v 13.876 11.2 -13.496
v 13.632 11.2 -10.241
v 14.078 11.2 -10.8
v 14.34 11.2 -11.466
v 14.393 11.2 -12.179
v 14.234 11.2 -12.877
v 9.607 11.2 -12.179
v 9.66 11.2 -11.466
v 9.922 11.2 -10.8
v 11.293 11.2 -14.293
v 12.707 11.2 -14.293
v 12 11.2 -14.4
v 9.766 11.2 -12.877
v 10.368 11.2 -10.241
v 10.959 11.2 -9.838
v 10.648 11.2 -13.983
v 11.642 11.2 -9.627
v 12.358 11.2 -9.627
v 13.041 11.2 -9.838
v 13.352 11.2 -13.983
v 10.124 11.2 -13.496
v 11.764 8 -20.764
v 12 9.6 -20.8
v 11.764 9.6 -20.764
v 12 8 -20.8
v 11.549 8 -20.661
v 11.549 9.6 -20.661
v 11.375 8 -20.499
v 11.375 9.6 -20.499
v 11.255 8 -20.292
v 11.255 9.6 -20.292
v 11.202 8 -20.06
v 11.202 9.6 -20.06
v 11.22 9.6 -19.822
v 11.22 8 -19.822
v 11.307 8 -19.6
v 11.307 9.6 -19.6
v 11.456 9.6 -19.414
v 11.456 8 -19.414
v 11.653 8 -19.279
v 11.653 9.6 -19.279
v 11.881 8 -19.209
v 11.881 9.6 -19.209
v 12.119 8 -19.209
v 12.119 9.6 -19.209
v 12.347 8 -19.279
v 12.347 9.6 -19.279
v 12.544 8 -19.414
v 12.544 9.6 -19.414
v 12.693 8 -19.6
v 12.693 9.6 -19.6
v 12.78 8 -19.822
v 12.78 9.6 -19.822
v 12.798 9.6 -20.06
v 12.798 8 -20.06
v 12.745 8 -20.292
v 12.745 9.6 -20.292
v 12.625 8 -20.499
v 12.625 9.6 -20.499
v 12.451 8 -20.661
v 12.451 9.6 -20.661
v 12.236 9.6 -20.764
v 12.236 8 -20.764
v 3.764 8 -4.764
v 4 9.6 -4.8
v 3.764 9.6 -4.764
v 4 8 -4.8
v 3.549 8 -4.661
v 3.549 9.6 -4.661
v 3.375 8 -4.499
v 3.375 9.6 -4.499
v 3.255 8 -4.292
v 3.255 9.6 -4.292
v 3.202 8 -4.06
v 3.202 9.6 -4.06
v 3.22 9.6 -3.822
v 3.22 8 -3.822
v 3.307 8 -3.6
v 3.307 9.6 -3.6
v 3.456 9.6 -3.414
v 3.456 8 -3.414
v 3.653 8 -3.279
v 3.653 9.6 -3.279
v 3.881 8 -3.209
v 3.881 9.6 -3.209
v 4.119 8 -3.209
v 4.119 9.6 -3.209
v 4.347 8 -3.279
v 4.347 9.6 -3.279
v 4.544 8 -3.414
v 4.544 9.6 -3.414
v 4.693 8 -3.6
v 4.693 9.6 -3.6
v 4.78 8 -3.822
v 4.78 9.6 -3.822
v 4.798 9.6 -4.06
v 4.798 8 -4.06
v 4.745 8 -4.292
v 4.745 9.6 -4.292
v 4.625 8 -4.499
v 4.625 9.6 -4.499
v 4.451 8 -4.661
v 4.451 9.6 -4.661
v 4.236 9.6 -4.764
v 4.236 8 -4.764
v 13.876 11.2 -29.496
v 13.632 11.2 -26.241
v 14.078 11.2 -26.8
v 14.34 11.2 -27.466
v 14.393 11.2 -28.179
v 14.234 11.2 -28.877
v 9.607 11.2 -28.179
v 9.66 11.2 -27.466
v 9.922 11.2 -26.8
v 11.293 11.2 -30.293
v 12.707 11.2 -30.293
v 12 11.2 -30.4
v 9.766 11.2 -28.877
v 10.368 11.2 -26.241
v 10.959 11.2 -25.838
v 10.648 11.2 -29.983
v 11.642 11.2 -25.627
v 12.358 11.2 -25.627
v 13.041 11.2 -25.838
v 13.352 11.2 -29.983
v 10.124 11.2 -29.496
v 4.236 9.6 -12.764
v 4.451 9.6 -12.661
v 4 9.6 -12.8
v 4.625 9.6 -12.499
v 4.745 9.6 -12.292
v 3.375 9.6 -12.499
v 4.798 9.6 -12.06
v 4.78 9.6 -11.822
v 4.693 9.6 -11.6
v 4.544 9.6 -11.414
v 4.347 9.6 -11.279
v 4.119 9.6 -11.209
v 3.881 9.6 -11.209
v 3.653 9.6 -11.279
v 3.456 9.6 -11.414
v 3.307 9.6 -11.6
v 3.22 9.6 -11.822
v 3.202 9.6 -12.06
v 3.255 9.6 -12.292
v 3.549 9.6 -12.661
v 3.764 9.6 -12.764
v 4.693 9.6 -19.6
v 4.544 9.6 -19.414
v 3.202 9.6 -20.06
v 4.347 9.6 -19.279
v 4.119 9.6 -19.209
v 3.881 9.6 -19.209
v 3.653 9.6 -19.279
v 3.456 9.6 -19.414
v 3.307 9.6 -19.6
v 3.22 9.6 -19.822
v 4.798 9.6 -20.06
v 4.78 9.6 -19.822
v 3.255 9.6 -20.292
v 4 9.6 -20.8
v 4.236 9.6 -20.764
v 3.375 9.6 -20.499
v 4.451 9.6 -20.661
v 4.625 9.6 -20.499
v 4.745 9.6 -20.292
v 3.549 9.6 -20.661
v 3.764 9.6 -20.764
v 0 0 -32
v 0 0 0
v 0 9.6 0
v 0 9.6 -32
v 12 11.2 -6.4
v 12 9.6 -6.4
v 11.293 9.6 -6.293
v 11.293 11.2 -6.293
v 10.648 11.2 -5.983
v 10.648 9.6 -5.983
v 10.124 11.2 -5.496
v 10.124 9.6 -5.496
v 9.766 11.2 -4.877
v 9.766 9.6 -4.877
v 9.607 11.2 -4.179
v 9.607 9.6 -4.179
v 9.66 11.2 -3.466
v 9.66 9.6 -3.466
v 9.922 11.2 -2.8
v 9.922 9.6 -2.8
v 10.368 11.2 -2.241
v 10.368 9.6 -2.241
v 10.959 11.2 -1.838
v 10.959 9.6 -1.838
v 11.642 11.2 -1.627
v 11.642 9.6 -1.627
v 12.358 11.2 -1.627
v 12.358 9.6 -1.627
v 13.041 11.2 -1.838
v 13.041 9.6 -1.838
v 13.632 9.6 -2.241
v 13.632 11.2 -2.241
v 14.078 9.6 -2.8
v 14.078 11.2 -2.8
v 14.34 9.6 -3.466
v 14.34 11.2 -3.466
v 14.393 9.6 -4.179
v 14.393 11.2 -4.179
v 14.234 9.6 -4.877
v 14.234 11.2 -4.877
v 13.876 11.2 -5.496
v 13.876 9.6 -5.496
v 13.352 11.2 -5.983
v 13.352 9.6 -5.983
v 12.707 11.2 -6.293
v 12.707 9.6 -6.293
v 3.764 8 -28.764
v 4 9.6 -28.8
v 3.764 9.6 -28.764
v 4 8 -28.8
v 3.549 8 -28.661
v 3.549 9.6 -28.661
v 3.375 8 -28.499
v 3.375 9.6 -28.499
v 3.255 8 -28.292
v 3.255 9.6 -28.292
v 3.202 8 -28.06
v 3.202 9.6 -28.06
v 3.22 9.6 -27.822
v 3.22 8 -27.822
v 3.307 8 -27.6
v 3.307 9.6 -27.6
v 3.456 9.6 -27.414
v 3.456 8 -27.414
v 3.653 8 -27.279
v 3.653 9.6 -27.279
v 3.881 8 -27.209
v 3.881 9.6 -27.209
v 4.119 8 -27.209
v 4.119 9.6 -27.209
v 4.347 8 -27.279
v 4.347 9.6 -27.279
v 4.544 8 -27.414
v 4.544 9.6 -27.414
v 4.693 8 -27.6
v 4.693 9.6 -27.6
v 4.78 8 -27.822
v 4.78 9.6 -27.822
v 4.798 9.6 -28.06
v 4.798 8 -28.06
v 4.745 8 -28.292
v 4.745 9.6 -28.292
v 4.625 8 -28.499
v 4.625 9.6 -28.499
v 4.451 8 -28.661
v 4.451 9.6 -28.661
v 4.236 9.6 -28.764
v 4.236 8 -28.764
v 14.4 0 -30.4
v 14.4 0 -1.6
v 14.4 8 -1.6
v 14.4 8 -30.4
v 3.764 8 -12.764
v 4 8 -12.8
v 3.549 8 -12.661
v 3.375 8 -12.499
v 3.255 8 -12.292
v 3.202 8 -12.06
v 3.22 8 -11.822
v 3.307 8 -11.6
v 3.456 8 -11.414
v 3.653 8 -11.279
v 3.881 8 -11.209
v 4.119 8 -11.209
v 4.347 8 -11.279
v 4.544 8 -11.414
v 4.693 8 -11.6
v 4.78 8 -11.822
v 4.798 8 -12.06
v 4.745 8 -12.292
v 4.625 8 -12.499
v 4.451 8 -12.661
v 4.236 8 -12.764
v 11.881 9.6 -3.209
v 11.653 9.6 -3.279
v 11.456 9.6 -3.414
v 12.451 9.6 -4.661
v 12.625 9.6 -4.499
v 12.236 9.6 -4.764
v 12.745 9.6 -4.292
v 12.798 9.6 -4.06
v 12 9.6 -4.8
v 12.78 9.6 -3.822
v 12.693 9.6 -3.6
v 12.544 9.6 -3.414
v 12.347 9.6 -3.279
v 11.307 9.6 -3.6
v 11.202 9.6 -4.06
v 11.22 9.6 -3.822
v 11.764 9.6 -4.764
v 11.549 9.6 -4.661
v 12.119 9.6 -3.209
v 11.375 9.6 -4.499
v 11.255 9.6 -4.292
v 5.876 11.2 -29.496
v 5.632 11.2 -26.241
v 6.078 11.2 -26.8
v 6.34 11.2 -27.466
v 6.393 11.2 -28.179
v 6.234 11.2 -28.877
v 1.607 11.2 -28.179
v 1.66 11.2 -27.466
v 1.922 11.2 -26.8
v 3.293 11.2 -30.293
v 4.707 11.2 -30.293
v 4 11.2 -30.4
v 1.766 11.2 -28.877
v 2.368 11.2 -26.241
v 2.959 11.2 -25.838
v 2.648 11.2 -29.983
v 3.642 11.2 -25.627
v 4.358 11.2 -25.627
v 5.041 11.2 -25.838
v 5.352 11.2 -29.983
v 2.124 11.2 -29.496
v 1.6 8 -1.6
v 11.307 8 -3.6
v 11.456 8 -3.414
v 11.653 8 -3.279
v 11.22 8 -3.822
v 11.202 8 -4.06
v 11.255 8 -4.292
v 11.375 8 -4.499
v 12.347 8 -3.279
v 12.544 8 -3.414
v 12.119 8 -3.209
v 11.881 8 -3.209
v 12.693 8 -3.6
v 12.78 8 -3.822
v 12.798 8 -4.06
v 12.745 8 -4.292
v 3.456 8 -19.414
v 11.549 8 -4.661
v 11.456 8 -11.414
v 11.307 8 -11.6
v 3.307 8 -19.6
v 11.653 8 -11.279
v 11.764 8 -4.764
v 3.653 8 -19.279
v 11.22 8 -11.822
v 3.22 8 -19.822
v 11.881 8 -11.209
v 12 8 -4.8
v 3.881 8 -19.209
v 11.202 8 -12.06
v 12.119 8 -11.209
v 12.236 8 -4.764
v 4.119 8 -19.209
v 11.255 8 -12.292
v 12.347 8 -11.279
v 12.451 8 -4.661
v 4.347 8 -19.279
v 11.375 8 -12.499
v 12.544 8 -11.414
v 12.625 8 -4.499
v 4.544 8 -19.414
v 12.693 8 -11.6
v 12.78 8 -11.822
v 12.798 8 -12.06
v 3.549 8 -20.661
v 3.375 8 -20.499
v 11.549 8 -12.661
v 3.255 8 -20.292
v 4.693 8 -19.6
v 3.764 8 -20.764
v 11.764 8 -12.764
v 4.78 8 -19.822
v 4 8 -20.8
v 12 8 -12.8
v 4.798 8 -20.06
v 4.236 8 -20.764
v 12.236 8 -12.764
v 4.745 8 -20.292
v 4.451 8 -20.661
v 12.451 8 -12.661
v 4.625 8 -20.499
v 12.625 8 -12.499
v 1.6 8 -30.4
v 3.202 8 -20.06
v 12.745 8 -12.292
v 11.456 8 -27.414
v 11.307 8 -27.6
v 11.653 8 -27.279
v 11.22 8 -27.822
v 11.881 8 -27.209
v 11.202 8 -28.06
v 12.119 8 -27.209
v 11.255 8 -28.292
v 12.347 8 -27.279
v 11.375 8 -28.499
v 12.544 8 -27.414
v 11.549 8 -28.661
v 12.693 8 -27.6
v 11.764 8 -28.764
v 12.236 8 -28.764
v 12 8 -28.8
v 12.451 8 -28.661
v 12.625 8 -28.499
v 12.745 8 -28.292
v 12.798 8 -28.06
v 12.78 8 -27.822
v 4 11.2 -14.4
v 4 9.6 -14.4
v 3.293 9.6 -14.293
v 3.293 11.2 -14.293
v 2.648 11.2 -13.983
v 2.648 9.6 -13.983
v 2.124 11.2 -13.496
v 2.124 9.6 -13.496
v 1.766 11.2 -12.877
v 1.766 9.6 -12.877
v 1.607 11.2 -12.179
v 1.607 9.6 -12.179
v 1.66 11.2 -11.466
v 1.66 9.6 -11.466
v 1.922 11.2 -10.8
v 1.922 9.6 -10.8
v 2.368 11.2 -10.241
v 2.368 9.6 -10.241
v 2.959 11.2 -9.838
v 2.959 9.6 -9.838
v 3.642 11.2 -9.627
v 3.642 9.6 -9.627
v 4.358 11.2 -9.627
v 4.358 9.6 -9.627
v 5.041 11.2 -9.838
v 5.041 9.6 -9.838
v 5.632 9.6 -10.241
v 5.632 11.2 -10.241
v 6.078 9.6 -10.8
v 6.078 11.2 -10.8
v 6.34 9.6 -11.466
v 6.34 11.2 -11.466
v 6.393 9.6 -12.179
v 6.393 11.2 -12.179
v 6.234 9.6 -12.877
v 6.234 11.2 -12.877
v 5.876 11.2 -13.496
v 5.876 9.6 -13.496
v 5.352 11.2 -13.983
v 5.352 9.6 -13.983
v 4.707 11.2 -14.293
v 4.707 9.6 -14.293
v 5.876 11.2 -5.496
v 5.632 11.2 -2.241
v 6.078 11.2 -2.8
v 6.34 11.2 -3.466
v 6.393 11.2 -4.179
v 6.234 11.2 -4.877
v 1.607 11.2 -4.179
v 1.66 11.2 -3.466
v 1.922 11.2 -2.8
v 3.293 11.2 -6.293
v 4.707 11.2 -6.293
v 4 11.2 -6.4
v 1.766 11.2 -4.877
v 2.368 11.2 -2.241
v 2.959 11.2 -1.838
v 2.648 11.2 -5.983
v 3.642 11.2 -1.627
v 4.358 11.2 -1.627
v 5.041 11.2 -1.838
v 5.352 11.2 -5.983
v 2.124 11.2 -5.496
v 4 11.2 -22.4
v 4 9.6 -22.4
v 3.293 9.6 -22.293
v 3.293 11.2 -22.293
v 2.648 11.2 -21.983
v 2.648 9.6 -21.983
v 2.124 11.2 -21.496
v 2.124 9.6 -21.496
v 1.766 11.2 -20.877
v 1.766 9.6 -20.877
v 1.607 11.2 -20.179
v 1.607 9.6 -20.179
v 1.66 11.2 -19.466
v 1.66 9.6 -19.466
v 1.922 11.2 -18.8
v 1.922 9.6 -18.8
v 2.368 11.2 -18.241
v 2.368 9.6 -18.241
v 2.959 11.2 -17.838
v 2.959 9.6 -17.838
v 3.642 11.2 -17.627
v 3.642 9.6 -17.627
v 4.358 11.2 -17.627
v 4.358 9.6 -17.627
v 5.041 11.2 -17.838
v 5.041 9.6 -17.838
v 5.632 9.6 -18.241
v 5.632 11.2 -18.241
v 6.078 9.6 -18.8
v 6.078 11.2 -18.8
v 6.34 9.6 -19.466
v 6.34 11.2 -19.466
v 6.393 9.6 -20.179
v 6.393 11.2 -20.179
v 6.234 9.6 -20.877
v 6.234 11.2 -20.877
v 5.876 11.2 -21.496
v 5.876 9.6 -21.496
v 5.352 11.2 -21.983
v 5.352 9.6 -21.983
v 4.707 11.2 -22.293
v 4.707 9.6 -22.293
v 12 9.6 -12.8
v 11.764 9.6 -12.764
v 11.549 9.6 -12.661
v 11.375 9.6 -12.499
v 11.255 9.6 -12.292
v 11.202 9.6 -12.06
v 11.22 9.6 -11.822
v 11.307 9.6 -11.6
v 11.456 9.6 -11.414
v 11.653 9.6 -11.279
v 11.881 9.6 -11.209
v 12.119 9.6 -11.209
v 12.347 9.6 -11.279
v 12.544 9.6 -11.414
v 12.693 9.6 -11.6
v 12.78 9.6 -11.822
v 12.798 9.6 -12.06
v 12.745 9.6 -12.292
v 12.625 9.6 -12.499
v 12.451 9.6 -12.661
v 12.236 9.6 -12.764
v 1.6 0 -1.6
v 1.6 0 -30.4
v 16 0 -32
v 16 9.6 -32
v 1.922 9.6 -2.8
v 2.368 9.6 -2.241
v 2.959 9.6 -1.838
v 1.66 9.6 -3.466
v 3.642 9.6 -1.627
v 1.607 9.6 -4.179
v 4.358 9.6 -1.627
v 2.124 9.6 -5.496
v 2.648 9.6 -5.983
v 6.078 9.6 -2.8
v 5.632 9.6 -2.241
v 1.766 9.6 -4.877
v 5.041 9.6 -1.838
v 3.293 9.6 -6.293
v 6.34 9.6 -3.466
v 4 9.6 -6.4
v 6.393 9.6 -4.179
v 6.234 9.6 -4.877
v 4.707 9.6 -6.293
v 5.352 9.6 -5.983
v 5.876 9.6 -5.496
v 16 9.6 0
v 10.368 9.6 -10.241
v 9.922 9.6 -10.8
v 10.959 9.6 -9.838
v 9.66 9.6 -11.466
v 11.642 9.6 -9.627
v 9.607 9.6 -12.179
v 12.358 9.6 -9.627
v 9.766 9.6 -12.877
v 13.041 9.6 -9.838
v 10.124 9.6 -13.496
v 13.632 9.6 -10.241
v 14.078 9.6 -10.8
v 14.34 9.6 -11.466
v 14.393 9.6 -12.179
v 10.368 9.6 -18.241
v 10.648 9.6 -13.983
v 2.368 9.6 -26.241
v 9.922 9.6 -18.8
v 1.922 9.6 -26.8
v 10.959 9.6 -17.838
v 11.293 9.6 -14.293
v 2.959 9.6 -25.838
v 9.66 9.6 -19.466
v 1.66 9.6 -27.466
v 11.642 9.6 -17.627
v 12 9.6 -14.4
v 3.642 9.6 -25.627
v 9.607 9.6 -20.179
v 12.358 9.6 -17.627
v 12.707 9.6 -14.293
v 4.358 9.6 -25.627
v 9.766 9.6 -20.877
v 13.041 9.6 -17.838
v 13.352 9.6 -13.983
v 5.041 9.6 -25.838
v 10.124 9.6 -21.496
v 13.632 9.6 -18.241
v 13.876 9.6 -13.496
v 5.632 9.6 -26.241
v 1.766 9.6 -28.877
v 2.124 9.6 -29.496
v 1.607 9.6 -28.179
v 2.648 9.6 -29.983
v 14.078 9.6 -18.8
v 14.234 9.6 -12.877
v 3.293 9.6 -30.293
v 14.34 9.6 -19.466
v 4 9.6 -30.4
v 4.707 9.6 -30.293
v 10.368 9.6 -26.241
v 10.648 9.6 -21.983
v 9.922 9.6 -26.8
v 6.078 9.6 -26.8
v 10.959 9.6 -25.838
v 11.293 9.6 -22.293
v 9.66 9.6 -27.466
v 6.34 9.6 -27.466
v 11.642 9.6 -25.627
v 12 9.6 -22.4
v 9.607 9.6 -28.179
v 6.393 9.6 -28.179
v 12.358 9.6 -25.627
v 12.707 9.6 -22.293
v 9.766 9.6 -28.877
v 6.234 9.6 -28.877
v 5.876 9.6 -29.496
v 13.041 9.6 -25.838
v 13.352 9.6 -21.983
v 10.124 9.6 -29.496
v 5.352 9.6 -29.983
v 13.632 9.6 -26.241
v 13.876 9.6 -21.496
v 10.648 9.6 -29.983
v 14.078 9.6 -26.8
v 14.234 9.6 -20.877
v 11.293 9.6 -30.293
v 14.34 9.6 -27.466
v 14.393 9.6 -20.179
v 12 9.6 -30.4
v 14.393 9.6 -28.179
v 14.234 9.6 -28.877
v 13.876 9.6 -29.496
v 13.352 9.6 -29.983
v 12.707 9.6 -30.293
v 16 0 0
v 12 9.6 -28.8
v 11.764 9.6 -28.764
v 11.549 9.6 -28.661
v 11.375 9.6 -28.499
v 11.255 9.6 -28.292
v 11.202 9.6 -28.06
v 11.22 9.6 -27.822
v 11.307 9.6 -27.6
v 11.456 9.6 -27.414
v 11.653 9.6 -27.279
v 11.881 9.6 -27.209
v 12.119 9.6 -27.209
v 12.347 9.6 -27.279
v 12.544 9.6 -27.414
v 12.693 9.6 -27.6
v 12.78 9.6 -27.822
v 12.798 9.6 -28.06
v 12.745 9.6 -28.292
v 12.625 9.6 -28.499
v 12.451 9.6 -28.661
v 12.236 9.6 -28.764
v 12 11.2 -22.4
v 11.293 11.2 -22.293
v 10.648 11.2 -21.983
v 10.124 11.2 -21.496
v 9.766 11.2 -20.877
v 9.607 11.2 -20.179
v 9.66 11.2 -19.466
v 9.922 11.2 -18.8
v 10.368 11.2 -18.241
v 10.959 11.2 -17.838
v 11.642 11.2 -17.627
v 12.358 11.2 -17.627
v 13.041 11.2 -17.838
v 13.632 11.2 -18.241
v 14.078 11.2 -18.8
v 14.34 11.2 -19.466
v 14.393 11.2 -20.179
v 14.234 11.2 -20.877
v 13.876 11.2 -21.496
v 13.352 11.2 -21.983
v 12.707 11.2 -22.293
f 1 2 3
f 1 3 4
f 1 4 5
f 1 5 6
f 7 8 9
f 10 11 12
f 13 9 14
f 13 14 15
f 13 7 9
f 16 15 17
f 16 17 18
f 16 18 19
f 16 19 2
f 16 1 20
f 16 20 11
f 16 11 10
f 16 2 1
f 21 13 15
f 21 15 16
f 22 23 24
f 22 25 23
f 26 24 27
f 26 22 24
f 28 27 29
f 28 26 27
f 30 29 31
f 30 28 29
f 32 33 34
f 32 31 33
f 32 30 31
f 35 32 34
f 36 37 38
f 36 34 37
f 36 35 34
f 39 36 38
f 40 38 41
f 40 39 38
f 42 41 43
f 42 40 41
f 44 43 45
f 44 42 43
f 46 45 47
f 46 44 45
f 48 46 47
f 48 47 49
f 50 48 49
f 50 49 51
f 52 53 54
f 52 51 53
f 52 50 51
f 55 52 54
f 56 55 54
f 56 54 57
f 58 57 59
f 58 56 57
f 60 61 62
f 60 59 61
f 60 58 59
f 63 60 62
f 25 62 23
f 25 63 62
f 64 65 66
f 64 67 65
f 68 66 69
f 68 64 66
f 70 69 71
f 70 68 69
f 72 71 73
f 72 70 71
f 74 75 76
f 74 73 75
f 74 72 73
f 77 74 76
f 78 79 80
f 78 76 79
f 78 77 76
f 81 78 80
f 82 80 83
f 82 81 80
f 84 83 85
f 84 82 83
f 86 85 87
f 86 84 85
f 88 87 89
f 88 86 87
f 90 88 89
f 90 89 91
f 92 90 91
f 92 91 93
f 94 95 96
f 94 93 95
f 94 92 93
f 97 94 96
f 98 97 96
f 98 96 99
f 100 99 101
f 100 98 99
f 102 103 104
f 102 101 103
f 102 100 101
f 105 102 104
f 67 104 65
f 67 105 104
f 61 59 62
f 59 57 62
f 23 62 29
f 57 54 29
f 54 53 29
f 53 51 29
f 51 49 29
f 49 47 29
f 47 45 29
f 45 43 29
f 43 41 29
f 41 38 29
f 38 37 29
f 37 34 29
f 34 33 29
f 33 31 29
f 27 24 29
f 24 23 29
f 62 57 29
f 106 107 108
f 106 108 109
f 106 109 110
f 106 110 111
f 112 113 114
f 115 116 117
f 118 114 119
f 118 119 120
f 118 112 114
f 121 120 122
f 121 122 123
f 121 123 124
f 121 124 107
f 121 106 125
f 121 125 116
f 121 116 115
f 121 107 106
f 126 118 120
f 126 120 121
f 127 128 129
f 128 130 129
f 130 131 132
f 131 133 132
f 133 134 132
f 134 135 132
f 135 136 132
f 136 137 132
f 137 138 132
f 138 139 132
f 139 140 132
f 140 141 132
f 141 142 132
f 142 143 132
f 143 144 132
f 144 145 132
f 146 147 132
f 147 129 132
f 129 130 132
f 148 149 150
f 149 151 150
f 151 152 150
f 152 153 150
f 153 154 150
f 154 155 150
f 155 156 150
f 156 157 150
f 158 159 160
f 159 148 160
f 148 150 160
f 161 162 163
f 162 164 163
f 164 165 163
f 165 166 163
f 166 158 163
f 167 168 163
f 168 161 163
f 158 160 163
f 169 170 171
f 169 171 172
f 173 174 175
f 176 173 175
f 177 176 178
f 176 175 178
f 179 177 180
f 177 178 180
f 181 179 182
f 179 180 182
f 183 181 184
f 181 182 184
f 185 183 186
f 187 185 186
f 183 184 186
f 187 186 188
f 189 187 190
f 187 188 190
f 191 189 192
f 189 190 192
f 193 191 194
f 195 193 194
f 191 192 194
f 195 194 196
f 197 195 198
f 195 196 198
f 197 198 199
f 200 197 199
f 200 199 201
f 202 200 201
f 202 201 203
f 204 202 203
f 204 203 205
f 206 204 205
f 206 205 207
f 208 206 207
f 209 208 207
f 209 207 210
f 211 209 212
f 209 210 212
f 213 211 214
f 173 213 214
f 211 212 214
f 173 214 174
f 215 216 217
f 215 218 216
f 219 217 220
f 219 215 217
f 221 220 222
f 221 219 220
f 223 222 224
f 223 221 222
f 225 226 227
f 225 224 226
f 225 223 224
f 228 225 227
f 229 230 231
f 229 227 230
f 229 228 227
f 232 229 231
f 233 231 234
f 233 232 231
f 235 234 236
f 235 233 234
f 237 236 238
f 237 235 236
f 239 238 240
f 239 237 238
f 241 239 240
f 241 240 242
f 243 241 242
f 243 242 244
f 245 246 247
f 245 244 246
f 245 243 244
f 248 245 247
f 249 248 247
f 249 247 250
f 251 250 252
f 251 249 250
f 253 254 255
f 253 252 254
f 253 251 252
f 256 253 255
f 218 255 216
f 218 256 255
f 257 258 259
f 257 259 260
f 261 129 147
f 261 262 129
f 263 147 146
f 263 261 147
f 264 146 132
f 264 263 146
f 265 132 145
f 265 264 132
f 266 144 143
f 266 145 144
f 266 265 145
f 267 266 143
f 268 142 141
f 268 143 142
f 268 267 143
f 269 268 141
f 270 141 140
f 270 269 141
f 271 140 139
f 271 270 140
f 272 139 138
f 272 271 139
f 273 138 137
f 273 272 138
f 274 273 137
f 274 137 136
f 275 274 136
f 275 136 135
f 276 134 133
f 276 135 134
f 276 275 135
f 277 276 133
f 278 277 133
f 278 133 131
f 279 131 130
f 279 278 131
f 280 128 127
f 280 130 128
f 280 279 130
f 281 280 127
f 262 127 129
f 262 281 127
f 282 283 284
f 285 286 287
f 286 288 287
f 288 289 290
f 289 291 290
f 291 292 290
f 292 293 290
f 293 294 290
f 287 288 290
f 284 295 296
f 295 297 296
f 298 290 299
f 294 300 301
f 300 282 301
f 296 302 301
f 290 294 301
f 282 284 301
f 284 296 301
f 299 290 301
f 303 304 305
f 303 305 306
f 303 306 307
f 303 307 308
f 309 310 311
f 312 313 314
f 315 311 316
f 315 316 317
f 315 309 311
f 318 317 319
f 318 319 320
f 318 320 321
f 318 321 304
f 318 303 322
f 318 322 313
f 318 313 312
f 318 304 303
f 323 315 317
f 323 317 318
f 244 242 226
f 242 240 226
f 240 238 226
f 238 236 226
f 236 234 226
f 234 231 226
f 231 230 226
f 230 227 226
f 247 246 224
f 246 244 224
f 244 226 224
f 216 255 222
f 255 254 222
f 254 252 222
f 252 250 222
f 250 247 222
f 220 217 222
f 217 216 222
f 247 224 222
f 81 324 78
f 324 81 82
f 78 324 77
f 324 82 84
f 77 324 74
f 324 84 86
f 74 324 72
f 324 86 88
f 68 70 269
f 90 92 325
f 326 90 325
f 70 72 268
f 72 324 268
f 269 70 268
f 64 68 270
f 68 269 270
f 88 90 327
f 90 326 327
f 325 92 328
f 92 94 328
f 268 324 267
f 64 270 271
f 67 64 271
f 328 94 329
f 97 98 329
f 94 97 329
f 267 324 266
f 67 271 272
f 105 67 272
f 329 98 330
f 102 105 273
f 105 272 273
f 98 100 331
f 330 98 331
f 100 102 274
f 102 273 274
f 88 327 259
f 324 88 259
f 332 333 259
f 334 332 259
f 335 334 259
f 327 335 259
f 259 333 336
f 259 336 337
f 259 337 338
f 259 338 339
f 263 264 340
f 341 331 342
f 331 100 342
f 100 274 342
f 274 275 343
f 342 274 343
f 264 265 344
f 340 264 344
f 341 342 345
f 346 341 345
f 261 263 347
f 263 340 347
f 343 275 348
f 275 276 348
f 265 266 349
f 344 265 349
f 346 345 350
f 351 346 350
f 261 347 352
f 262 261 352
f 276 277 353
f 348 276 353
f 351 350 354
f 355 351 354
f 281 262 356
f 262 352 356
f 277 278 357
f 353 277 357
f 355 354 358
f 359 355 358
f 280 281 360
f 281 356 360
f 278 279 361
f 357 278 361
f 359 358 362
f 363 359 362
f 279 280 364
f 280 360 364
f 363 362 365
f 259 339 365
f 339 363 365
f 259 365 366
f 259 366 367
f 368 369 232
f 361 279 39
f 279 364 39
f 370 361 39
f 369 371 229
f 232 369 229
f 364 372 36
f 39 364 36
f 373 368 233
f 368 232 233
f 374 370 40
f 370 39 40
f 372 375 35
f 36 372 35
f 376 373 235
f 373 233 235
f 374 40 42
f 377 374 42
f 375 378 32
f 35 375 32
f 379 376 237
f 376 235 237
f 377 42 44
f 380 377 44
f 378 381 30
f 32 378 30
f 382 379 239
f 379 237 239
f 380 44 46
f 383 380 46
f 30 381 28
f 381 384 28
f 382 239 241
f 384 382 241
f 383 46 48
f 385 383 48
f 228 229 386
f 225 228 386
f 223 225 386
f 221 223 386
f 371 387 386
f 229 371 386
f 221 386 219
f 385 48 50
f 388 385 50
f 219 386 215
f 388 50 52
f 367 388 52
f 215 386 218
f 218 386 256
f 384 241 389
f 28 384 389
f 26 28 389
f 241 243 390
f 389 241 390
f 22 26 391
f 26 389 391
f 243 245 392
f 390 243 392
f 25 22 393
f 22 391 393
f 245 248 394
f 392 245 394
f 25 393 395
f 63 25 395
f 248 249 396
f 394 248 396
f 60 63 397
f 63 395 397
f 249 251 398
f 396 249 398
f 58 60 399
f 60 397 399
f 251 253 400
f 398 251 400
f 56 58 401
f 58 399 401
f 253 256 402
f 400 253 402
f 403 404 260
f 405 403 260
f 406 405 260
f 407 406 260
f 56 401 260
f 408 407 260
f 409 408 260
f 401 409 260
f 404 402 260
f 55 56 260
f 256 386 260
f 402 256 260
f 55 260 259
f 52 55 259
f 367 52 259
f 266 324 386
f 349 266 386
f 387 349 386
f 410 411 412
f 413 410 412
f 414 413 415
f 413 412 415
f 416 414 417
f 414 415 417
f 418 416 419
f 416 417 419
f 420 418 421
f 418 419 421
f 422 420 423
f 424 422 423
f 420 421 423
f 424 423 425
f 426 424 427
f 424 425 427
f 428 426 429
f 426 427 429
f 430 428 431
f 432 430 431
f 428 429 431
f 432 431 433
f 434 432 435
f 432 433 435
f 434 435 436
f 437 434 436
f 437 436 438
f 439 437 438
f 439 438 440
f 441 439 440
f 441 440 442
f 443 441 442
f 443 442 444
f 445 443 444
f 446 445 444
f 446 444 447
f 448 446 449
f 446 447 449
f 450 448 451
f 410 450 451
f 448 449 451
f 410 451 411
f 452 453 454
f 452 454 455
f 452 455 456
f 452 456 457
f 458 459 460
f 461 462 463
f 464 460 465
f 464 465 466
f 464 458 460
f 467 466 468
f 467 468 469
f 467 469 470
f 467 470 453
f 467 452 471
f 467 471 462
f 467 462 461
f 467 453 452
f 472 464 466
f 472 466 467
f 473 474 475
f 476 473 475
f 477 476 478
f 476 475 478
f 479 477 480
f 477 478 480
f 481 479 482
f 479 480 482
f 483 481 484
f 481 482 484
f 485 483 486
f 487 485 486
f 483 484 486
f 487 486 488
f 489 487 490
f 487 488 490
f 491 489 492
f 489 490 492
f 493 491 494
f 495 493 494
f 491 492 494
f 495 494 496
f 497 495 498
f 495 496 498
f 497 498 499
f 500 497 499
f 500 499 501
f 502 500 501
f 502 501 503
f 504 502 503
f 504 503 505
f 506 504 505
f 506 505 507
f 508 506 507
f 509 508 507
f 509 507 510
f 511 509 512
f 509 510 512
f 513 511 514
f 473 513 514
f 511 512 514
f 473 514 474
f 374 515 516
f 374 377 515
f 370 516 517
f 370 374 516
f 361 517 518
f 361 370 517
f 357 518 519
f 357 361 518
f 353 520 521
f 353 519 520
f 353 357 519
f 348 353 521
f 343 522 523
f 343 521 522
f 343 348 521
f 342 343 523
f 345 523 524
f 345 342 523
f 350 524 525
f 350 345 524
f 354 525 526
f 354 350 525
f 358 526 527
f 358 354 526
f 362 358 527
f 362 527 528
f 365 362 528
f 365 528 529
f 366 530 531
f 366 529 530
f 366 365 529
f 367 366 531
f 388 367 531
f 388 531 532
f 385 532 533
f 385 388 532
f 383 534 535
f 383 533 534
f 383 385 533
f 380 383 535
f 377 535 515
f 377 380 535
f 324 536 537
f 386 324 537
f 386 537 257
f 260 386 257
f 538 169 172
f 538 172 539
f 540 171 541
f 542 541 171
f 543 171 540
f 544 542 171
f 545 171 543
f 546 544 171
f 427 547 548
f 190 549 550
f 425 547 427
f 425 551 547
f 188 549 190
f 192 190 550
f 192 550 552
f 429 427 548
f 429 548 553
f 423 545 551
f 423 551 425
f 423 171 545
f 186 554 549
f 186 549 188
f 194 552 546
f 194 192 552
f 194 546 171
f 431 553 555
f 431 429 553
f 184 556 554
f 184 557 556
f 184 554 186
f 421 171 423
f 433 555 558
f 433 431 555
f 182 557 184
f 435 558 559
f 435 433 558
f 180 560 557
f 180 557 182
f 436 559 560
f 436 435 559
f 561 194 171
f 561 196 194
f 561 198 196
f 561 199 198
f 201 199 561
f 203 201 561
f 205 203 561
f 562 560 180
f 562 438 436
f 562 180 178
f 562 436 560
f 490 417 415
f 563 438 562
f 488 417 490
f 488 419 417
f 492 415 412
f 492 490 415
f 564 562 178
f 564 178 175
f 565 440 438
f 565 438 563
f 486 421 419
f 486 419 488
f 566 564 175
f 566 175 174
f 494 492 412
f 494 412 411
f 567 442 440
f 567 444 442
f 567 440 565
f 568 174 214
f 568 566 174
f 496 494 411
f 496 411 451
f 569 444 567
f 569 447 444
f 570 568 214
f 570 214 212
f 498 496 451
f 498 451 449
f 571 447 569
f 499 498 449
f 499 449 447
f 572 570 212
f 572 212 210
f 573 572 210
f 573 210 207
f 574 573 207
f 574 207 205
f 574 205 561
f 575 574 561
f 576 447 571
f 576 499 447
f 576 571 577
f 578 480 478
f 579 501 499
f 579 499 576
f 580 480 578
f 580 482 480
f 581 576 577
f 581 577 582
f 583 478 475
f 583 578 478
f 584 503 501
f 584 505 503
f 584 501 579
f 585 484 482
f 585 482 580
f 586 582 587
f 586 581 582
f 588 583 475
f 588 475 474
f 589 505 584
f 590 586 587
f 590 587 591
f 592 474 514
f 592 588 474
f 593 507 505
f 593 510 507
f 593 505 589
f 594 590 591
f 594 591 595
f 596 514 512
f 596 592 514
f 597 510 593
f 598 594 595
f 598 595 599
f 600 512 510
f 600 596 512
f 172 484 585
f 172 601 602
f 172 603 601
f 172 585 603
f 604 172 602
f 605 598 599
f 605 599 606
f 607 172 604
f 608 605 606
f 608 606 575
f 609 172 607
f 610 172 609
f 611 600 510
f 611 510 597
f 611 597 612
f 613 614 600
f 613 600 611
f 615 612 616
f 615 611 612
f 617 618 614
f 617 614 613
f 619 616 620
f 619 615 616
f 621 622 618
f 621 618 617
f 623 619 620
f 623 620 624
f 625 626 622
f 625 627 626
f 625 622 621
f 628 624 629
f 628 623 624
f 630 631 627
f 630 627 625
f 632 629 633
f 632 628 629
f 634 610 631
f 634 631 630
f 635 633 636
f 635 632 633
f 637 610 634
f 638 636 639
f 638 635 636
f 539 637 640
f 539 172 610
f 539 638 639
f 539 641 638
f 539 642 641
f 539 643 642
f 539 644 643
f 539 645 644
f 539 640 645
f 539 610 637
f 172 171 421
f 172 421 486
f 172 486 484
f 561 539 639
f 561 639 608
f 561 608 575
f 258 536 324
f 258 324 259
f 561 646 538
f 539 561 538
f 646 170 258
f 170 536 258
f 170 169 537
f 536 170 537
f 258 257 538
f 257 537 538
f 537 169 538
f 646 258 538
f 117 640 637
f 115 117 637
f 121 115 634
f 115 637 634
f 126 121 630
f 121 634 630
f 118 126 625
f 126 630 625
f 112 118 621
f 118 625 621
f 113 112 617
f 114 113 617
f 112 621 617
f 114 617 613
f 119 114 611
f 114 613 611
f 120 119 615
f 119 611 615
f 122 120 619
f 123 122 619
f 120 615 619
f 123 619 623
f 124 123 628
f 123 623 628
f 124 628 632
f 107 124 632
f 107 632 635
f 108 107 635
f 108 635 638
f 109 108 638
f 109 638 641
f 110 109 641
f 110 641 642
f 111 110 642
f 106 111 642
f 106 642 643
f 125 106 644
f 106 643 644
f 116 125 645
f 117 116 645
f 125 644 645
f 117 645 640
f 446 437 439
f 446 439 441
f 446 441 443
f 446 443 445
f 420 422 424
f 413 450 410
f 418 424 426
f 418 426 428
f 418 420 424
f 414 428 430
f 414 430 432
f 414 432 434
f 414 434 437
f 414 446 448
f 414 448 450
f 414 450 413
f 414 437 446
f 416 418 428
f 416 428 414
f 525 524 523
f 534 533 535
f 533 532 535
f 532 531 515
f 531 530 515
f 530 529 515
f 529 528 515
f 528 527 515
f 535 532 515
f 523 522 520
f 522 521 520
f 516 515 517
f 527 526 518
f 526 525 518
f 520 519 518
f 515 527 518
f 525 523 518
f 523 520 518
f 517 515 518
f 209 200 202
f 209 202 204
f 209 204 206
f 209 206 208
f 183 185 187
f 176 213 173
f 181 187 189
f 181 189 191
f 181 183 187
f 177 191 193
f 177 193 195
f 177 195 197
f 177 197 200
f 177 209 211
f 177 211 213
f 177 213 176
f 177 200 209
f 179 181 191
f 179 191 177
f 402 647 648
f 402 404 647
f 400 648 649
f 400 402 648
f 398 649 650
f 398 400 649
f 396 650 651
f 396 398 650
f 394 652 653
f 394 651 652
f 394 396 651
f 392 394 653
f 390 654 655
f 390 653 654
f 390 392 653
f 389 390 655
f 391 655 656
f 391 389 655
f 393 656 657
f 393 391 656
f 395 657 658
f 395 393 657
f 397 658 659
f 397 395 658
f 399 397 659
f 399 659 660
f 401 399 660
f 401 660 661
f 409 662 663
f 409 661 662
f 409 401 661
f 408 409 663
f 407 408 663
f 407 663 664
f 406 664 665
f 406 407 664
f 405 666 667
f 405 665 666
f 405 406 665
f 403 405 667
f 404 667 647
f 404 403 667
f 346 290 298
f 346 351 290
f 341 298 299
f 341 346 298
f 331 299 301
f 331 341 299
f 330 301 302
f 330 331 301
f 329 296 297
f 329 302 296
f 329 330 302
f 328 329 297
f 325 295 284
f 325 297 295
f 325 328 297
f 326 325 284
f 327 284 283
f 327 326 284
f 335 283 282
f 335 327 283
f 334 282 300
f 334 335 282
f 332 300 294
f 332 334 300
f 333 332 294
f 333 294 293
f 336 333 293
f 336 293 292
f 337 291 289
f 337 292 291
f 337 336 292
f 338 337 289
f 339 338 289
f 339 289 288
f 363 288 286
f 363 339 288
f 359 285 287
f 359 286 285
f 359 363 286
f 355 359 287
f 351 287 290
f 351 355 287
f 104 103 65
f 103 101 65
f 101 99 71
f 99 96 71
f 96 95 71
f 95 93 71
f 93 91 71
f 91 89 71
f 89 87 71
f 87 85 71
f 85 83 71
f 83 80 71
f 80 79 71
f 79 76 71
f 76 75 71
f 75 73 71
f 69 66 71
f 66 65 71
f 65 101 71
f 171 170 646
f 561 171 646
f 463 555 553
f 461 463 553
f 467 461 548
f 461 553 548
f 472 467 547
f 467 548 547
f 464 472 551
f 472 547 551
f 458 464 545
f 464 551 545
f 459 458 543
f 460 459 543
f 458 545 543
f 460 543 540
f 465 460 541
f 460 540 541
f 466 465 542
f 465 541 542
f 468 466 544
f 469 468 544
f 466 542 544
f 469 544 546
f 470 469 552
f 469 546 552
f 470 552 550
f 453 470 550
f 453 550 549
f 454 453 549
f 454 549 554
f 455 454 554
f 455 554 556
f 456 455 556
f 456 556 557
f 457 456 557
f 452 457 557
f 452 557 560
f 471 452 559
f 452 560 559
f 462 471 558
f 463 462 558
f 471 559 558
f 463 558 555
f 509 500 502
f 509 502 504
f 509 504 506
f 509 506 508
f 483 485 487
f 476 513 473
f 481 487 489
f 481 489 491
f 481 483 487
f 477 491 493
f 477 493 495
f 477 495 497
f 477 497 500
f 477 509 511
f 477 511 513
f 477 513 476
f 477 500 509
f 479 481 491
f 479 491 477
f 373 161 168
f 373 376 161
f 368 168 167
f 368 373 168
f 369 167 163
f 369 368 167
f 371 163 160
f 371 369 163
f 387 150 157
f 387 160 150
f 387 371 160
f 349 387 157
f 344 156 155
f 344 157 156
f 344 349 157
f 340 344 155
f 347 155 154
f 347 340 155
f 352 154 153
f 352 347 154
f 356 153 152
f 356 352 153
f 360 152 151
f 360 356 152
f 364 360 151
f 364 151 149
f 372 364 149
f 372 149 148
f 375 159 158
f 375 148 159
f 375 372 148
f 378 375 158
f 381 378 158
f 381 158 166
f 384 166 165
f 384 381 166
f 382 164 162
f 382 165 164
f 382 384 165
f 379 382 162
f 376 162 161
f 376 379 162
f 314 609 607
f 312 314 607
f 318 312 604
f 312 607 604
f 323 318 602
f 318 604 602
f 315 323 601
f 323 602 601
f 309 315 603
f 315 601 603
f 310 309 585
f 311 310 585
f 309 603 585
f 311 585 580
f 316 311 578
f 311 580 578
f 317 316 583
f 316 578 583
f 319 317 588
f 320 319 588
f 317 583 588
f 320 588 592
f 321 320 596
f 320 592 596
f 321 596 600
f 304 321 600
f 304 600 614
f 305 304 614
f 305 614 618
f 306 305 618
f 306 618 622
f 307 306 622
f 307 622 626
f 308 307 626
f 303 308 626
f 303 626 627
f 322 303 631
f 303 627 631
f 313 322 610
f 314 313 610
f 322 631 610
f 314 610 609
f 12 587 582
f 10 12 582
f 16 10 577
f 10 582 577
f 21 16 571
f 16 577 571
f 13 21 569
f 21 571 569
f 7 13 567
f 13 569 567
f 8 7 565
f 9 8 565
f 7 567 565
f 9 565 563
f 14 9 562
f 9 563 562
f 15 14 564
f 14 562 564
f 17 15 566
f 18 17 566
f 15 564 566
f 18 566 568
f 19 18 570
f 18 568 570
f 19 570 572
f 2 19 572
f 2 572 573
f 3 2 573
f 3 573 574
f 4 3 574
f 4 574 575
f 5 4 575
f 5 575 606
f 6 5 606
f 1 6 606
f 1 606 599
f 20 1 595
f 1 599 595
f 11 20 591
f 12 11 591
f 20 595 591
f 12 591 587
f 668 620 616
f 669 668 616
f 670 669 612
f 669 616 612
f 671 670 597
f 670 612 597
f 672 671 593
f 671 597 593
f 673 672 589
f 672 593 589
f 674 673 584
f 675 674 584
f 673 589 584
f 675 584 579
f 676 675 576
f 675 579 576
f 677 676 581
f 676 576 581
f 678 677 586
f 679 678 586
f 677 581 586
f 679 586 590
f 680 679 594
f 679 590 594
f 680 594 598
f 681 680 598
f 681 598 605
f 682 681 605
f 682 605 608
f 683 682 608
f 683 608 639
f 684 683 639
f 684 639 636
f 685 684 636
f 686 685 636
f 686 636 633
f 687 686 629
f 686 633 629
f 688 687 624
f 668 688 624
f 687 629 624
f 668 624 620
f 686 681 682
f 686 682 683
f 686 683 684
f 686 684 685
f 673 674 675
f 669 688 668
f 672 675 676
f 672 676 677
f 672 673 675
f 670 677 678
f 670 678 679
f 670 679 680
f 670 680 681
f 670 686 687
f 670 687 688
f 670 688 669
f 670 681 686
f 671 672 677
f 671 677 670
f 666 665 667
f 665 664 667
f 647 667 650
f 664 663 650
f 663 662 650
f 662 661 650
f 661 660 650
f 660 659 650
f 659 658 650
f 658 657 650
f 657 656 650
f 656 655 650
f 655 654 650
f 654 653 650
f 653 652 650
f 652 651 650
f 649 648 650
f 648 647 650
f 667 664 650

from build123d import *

# Parameters (mm, degrees)
SKETCH1_W            = 16
SKETCH1_H            = 32
BOSS_EXTRUDE1_DEPTH  = 9.6
SKETCH2_R            = 2.4
BOSS_EXTRUDE2_DEPTH  = 1.6
LPATTERN1_COUNT      = 2
LPATTERN1_PITCH      = 8
LPATTERN1_COUNT_DIR2 = 4
LPATTERN1_PITCH_DIR2 = 8
SHELL1_T             = -1.6


with BuildPart() as part:
    # Sketch1 → Boss-Extrude1 (new body)
    with BuildSketch(Plane(origin=(0, 0, 0), x_dir=(1, 0, 0), z_dir=(0, 1, 0))):
        with Locations((8, 16)):
            Rectangle(SKETCH1_W, SKETCH1_H)
    extrude(amount=BOSS_EXTRUDE1_DEPTH)

    # Sketch2 → Boss-Extrude2 (add)
    with BuildSketch(Plane(origin=(0, 9.6, 0), x_dir=(1, 0, 0), z_dir=(0, 1, 0))):
        with Locations(Location((12, 4, 0), (0, 0, 90))):
            Circle(SKETCH2_R)
    boss_extrude2 = extrude(amount=BOSS_EXTRUDE2_DEPTH)

    # LPattern1: Boss-Extrude2 2 × 4
    with Locations(*[(-i * LPATTERN1_PITCH, 0, -j * LPATTERN1_PITCH_DIR2) for i in range(LPATTERN1_COUNT) for j in range(LPATTERN1_COUNT_DIR2) if (i, j) != (0, 0)]):
        add(boss_extrude2)

    # Shell1
    shell1_openings = [part.faces().sort_by_distance(p)[0] for p in [
        (8, 0, -16),
    ]]
    offset(amount=SHELL1_T, openings=shell1_openings, kind=Kind.INTERSECTION)


solid = part.part
